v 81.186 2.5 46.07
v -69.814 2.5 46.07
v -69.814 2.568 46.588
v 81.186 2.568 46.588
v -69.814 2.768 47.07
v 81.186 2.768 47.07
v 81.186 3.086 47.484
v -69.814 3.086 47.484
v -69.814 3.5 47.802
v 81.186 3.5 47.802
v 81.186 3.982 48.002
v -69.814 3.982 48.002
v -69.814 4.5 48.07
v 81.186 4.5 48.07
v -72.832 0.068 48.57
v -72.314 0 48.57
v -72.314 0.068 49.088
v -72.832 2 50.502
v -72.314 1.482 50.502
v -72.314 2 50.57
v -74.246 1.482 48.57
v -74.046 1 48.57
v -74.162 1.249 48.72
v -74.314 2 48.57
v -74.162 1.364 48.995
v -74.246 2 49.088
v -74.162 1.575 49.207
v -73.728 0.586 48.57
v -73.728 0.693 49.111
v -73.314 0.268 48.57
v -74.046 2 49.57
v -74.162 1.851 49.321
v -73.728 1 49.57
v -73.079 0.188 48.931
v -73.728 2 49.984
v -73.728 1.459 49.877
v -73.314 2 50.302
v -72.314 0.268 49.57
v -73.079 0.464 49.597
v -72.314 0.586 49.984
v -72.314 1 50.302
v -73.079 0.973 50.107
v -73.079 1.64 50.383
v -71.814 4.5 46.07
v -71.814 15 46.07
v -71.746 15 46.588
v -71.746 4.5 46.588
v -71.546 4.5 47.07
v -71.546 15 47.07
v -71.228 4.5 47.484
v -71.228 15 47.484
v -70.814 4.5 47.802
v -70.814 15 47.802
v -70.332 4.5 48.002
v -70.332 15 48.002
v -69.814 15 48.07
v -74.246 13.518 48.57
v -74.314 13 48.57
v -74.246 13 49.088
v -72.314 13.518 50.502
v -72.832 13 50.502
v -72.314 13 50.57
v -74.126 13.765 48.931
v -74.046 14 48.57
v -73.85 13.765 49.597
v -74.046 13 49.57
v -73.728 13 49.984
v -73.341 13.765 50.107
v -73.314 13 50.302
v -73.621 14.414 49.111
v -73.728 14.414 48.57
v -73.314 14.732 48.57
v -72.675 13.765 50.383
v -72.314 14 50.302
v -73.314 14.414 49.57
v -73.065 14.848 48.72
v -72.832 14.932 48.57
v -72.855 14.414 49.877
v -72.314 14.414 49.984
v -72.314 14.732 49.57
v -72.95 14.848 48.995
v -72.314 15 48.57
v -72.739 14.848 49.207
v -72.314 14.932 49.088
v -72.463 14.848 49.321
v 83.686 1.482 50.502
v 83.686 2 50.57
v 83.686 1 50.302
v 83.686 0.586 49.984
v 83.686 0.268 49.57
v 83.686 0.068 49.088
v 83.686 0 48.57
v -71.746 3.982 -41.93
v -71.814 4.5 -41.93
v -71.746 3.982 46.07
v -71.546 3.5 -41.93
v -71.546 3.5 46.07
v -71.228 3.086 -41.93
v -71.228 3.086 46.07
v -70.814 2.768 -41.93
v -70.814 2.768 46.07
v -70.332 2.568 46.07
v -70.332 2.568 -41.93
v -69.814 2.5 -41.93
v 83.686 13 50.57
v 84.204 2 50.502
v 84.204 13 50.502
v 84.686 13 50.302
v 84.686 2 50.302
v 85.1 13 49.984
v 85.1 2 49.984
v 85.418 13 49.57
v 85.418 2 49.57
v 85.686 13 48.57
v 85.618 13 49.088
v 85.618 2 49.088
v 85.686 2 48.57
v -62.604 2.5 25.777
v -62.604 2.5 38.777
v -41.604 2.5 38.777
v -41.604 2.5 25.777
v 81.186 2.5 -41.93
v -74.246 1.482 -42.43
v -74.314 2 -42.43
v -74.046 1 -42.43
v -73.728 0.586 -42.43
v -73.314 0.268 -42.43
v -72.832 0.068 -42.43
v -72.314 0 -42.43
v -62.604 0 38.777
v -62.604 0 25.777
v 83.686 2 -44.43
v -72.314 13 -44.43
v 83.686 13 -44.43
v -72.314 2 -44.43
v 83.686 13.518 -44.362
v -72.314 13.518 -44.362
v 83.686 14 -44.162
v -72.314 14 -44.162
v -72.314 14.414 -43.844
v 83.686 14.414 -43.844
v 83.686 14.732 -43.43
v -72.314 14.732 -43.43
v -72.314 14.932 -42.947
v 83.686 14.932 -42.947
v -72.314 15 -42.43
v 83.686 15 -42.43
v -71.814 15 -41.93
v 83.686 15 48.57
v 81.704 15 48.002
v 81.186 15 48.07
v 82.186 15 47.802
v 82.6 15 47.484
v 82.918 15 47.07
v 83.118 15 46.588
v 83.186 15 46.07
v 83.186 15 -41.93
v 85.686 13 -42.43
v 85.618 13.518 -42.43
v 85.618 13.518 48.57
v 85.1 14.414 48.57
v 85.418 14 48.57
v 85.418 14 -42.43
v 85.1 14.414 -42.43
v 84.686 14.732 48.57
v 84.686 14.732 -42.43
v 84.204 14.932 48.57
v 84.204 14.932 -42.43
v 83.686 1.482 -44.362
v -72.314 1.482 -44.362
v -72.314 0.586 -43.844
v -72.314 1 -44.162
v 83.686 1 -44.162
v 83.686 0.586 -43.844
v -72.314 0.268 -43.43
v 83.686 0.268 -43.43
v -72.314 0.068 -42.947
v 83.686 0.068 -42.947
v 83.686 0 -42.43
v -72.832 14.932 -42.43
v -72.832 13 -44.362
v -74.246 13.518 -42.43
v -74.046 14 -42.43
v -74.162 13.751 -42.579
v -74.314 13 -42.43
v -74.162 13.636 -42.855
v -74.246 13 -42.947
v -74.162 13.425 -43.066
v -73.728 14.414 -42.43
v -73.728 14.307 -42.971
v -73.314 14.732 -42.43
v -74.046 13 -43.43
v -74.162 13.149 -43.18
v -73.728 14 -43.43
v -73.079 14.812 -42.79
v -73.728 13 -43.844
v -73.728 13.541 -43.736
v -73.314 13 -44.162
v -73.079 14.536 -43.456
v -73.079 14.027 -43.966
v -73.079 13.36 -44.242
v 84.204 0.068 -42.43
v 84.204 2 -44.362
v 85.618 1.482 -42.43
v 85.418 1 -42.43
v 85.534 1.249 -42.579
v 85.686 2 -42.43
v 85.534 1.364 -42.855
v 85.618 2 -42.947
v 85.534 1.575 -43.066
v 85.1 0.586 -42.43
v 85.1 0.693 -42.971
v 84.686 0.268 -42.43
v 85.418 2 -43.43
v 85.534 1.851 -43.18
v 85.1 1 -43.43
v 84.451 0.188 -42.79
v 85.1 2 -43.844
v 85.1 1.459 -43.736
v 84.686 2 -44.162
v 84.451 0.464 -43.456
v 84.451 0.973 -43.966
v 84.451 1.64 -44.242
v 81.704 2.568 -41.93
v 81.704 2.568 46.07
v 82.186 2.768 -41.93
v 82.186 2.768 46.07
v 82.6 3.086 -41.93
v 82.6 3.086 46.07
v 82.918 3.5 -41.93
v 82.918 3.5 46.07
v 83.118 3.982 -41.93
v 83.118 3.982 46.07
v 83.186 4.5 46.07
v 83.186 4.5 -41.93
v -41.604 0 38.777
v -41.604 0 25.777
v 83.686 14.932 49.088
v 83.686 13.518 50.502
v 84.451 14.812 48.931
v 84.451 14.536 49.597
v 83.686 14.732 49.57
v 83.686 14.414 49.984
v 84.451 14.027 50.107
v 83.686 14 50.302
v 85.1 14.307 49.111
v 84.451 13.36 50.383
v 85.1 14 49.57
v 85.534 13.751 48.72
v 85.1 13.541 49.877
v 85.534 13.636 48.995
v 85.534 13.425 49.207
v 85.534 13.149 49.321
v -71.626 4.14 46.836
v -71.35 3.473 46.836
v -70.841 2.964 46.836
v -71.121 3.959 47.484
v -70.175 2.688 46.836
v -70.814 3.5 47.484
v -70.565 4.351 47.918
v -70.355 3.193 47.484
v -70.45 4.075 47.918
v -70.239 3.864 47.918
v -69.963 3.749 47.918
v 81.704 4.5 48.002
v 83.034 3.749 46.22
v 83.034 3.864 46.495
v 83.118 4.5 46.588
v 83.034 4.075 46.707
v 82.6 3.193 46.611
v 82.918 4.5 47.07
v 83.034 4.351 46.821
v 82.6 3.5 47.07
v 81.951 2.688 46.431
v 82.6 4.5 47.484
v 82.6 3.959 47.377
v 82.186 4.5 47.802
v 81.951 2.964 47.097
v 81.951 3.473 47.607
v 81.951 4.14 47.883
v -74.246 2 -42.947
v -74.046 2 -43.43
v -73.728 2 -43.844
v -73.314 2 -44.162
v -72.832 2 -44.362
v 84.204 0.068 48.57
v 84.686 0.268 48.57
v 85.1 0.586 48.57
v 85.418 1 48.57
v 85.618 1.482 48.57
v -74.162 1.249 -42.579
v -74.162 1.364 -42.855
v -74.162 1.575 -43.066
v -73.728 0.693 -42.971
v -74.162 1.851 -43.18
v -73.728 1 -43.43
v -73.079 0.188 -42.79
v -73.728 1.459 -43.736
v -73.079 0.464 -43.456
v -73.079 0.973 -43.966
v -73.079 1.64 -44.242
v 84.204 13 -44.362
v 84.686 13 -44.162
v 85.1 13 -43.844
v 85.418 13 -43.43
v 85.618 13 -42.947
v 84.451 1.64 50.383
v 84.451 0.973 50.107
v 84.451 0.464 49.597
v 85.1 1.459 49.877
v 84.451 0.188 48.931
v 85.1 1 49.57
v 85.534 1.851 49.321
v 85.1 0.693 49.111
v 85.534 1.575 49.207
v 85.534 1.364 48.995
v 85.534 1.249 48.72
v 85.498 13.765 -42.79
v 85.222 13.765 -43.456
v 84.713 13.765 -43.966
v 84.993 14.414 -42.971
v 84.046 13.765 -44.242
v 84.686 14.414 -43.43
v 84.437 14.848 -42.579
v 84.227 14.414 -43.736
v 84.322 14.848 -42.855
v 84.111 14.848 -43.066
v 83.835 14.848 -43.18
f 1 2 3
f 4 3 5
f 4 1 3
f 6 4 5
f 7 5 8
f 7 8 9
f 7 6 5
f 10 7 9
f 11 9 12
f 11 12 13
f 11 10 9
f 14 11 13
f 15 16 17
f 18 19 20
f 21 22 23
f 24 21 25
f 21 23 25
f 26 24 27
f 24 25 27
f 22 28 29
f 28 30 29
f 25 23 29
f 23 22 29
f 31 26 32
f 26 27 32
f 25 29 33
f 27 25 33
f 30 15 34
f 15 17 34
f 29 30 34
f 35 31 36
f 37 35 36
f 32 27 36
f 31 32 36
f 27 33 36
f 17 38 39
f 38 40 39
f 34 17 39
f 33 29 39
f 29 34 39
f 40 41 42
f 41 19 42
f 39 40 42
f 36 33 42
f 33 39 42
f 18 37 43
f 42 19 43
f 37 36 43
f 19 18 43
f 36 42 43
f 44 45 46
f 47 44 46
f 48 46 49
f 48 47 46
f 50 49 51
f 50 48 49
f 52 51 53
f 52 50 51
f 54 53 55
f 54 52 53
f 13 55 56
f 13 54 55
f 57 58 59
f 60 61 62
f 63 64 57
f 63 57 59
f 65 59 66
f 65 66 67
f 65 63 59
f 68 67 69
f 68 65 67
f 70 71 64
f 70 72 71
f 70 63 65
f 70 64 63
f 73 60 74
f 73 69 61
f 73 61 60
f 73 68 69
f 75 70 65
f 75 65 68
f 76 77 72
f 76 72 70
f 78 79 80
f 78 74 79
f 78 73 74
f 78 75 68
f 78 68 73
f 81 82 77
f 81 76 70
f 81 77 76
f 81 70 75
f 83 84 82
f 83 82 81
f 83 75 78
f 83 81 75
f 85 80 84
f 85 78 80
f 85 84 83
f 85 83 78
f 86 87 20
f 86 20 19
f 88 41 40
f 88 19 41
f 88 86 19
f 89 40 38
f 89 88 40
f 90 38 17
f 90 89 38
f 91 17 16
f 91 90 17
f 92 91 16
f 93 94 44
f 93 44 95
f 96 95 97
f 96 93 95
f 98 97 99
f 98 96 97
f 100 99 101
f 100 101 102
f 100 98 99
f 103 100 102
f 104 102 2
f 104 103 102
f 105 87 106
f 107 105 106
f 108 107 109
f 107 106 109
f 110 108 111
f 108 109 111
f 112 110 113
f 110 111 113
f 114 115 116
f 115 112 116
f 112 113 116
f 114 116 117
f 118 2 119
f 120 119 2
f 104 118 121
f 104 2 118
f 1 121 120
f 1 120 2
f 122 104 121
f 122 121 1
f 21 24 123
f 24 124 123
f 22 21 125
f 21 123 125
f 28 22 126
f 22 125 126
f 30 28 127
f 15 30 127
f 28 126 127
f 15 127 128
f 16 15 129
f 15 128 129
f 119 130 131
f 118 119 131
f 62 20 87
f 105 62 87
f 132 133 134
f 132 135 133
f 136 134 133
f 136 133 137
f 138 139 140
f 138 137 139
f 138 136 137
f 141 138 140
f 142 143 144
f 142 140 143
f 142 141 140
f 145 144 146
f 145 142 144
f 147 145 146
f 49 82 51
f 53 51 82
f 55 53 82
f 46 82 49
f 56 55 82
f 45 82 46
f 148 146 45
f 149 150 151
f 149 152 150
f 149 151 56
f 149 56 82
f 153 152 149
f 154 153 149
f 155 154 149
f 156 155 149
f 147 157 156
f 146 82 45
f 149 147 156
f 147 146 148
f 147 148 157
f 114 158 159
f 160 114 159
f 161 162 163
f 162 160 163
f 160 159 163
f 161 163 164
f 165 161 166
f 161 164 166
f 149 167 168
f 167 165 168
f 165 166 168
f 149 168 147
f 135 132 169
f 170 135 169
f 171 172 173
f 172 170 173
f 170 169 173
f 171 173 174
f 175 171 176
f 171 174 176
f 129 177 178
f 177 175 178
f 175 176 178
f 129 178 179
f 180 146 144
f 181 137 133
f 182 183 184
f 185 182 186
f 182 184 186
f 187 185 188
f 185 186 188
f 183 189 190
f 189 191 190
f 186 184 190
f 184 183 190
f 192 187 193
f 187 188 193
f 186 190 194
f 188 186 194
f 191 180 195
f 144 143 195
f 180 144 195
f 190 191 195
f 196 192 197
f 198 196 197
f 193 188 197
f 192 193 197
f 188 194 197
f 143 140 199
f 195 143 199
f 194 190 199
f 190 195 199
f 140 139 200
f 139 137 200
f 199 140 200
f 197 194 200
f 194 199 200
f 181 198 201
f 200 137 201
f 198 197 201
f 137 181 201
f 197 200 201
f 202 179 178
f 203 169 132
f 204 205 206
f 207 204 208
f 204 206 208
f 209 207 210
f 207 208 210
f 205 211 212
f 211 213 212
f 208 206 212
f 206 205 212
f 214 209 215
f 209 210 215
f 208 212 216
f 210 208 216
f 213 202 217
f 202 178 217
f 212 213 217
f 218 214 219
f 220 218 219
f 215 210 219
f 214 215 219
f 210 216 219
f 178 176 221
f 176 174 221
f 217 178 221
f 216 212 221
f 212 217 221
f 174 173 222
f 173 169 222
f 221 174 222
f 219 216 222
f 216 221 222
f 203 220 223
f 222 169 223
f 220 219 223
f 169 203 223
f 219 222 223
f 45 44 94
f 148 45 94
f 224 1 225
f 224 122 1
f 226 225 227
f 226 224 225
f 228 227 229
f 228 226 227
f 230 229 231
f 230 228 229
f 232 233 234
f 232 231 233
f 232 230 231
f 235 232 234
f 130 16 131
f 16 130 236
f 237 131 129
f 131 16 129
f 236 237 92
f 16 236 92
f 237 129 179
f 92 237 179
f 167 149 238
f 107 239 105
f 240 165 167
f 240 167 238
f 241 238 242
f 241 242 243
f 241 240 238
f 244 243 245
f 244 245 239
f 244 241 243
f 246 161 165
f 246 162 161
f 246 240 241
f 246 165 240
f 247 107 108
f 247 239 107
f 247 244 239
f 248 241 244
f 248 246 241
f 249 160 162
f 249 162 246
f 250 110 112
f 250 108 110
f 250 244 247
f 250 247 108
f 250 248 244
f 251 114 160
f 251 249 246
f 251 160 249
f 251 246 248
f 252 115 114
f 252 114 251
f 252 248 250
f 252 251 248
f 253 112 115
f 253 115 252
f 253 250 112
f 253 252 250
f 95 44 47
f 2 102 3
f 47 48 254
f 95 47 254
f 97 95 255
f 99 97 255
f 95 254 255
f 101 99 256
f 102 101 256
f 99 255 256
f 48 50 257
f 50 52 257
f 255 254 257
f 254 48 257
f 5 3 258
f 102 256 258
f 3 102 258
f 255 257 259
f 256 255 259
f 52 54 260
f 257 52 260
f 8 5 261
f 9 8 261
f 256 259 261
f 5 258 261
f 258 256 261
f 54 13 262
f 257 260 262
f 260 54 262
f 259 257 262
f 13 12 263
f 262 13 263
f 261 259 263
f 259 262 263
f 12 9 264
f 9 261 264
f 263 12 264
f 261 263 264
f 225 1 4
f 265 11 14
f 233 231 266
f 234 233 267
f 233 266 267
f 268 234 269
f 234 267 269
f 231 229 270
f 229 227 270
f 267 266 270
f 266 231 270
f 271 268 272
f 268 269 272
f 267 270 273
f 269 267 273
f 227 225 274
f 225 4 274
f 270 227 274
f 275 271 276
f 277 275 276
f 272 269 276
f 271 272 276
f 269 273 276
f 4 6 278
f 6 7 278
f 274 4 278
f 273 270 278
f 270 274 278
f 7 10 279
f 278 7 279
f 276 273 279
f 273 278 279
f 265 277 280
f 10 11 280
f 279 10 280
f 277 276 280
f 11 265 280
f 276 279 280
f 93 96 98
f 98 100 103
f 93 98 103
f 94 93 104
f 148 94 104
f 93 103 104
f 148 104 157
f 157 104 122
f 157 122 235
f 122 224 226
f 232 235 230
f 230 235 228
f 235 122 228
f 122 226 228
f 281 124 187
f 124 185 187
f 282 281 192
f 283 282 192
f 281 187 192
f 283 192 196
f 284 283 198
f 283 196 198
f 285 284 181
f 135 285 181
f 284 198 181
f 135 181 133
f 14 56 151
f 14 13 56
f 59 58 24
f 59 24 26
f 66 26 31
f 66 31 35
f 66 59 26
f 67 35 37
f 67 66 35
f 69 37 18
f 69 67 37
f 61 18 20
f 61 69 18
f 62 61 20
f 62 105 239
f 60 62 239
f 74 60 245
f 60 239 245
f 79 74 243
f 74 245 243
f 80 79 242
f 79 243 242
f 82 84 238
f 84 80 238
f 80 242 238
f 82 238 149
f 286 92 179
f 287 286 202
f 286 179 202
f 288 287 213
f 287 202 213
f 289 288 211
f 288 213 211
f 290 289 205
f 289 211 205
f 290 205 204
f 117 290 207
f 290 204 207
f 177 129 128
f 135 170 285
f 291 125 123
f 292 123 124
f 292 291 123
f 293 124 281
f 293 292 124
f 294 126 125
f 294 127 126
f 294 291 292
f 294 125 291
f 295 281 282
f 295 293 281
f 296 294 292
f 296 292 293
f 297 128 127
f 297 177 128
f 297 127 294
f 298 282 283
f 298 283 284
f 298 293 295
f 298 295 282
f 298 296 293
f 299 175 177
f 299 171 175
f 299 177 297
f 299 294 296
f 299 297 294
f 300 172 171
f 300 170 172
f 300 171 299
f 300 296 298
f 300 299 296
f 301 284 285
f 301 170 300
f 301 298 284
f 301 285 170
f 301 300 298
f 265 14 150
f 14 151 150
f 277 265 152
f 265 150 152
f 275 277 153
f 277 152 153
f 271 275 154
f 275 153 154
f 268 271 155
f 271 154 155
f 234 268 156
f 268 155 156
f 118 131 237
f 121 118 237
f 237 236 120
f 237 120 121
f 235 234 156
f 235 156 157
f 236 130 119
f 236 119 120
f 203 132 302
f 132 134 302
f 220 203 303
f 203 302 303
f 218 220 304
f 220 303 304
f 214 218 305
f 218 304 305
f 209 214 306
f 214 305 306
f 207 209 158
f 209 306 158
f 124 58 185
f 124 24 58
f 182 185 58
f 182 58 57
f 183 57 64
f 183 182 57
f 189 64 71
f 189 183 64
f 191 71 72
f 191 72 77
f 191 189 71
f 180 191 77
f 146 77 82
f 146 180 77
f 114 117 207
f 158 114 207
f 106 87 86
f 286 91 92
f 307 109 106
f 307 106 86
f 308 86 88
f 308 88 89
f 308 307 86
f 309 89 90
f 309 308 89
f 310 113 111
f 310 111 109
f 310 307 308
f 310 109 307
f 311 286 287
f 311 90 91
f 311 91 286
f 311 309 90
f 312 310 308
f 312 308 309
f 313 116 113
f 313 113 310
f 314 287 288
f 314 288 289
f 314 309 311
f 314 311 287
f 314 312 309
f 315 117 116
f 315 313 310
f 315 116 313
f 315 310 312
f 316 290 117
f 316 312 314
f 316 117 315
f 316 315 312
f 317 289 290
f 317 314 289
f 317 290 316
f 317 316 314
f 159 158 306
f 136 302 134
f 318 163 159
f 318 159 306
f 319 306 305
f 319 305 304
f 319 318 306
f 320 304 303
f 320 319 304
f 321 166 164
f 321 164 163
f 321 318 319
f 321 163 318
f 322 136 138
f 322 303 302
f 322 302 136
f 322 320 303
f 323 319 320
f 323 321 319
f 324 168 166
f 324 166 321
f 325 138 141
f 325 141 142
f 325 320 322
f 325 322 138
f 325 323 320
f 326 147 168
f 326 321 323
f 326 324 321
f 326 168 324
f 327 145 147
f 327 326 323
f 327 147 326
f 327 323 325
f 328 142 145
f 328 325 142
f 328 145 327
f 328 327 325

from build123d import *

# Parameters (mm, degrees)
SKETCH1_W           = 160
SKETCH1_H           = 95
BOSS_EXTRUDE1_DEPTH = 15
SHELL1_T            = -2.5
SKETCH2_W           = 21
SKETCH2_H           = 13
CUT_EXTRUDE1_DEPTH  = 15
FILLET2_R           = 2
FILLET8_R           = 2
FILLET13_R          = 2


with BuildPart() as part:
    # Sketch1 → Boss-Extrude1 (new body)
    with BuildSketch(Plane(origin=(0, 0, 0), x_dir=(1, 0, 0), z_dir=(0, 1, 0))):
        with Locations((5.685950413, -3.070247934)):
            Rectangle(SKETCH1_W, SKETCH1_H)
    extrude(amount=BOSS_EXTRUDE1_DEPTH)

    # Shell1
    shell1_openings = [part.faces().sort_by_distance(p)[0] for p in [
        (5.685950413, 15, 3.070247934),
    ]]
    offset(amount=SHELL1_T, openings=shell1_openings, kind=Kind.INTERSECTION)

    # Sketch2 → Cut-Extrude1 (cut)
    with BuildSketch(Plane(origin=(0, 0, 0), x_dir=(1, 0, 0), z_dir=(0, 1, 0))):
        with Locations((-52.103761913, -32.277000916)):
            Rectangle(SKETCH2_W, SKETCH2_H)
    extrude(amount=CUT_EXTRUDE1_DEPTH, mode=Mode.SUBTRACT)

    # Fillet2
    fillet2_edges = [part.edges().sort_by_distance(p)[0] for p in [
        (5.685950413, 15, -44.429752066),
        (-74.314049587, 15, 3.070247934),
        (5.685950413, 0, -44.429752066),
        (85.685950413, 0, 3.070247934),
        (5.685950413, 0, 50.570247934),
        (-74.314049587, 0, 3.070247934),
        (-74.314049587, 7.5, -44.429752066),
        (85.685950413, 7.5, -44.429752066),
        (-74.314049587, 7.5, 50.570247934),
    ]]
    fillet(fillet2_edges, radius=FILLET2_R)

    # Fillet8
    # the kernel refuses this fillet: 2 mm, written as the material it adds along each edge
    with BuildSketch(Plane(origin=(-71.814049587, 2.5, -41.929752066), x_dir=(0, 1, 0), z_dir=(0, 0, 1))) as fillet8_piece_1:
        with BuildLine():
            CenterArc((FILLET8_R, -FILLET8_R), FILLET8_R, 90, 90)
            Line((0, -FILLET8_R), (0, 0))
            Line((0, 0), (FILLET8_R, 0))
        make_face()
    extrude(amount=90)
    # the kernel refuses this fillet: 2 mm, written as the material it takes off along each edge
    with BuildSketch(Plane(origin=(83.685950413, 13, -42.429752066), x_dir=(1, 0, 0), z_dir=(0, 1, 0))) as fillet8_2_piece_1_section:
        Polygon((0, 0), (FILLET8_R * 1.02, 0), (FILLET8_R * 1.02, FILLET8_R * 1.02), (0, FILLET8_R * 1.02), align=None)
    fillet8_2_piece_1 = extrude(amount=FILLET8_R * 1.02, mode=Mode.PRIVATE)
    fillet8_2_piece_1 = fillet8_2_piece_1 - Plane(origin=(83.685950413, 13, -42.429752066), x_dir=(-0.7071067811865476, 0, 0.7071067811865475), z_dir=(0, 1, 0)) * Sphere(FILLET8_R, mode=Mode.PRIVATE)
    add(fillet8_2_piece_1, mode=Mode.SUBTRACT)
    with BuildSketch(Plane(origin=(83.685950413, 2, 48.570247934), x_dir=(0, 0, 1), z_dir=(1, 0, 0))) as fillet8_2_piece_2_section:
        Polygon((0, 0), (FILLET8_R * 1.02, 0), (FILLET8_R * 1.02, FILLET8_R * 1.02), (0, FILLET8_R * 1.02), align=None)
    fillet8_2_piece_2 = extrude(amount=FILLET8_R * 1.02, mode=Mode.PRIVATE)
    fillet8_2_piece_2 = fillet8_2_piece_2 - Plane(origin=(83.685950413, 2, 48.570247934), x_dir=(0, 0.7071067811865475, -0.7071067811865475), z_dir=(1, 0, 0)) * Sphere(FILLET8_R, mode=Mode.PRIVATE)
    add(fillet8_2_piece_2, mode=Mode.SUBTRACT)
    with BuildSketch(Plane(origin=(-72.314049587, 13, 48.570247934), x_dir=(0, 0, 1), z_dir=(0, 1, 0))) as fillet8_2_piece_3_section:
        Polygon((0, 0), (FILLET8_R * 1.02, 0), (FILLET8_R * 1.02, -FILLET8_R * 1.02), (0, -FILLET8_R * 1.02), align=None)
    fillet8_2_piece_3 = extrude(amount=FILLET8_R * 1.02, mode=Mode.PRIVATE)
    fillet8_2_piece_3 = fillet8_2_piece_3 - Plane(origin=(-72.314049587, 13, 48.570247934), x_dir=(0.7071067811865475, 0, -0.7071067811865475), z_dir=(0, 1, 0)) * Sphere(FILLET8_R, mode=Mode.PRIVATE)
    add(fillet8_2_piece_3, mode=Mode.SUBTRACT)
    with BuildSketch(Plane(origin=(83.685950413, 13, 48.570247934), x_dir=(0, 0, 1), z_dir=(1, 0, 0))) as fillet8_2_piece_4_section:
        Polygon((0, 0), (FILLET8_R * 1.02, 0), (FILLET8_R * 1.02, -FILLET8_R * 1.02), (0, -FILLET8_R * 1.02), align=None)
    fillet8_2_piece_4 = extrude(amount=FILLET8_R * 1.02, mode=Mode.PRIVATE)
    fillet8_2_piece_4 = fillet8_2_piece_4 - Plane(origin=(83.685950413, 13, 48.570247934), x_dir=(0, -0.7071067811865475, -0.7071067811865475), z_dir=(1, 0, 0)) * Sphere(FILLET8_R, mode=Mode.PRIVATE)
    add(fillet8_2_piece_4, mode=Mode.SUBTRACT)
    with BuildSketch(Plane(origin=(85.685950413, 15, -42.429752066), x_dir=(-1, 0, 0), z_dir=(0, 0, 1))) as fillet8_2_piece_5:
        with BuildLine():
            CenterArc((FILLET8_R, FILLET8_R), FILLET8_R, 180, 90)
            Line((0, FILLET8_R), (0, 0))
            Line((0, 0), (FILLET8_R, 0))
        make_face()
    extrude(amount=91, mode=Mode.SUBTRACT)
    with BuildSketch(Plane(origin=(83.685950413, 15, 50.570247934), x_dir=(0, 0, -1), z_dir=(-1, 0, 0))) as fillet8_2_piece_6:
        with BuildLine():
            CenterArc((FILLET8_R, FILLET8_R), FILLET8_R, 180, 90)
            Line((0, FILLET8_R), (0, 0))
            Line((0, 0), (FILLET8_R, 0))
        make_face()
    extrude(amount=156, mode=Mode.SUBTRACT)
    with BuildSketch(Plane(origin=(85.685950413, 2, 50.570247934), x_dir=(0, 0, -1), z_dir=(0, 1, 0))) as fillet8_2_piece_7:
        with BuildLine():
            CenterArc((FILLET8_R, FILLET8_R), FILLET8_R, 180, 90)
            Line((0, FILLET8_R), (0, 0))
            Line((0, 0), (FILLET8_R, 0))
        make_face()
    extrude(amount=11, mode=Mode.SUBTRACT)

    # Fillet13
    fillet13_edges = [part.edges().sort_by_distance(p)[0] for p in [
        (-71.814049587, 9.75, 48.070247934),
        (83.185950413, 2.5, 3.070247934),
        (83.185950413, 8.75, 48.070247934),
        (6.685950413, 2.5, 48.070247934),
        (-71.228263149, 3.085786438, 48.070247934),
    ]]
    fillet(fillet13_edges, radius=FILLET13_R)


solid = part.part
